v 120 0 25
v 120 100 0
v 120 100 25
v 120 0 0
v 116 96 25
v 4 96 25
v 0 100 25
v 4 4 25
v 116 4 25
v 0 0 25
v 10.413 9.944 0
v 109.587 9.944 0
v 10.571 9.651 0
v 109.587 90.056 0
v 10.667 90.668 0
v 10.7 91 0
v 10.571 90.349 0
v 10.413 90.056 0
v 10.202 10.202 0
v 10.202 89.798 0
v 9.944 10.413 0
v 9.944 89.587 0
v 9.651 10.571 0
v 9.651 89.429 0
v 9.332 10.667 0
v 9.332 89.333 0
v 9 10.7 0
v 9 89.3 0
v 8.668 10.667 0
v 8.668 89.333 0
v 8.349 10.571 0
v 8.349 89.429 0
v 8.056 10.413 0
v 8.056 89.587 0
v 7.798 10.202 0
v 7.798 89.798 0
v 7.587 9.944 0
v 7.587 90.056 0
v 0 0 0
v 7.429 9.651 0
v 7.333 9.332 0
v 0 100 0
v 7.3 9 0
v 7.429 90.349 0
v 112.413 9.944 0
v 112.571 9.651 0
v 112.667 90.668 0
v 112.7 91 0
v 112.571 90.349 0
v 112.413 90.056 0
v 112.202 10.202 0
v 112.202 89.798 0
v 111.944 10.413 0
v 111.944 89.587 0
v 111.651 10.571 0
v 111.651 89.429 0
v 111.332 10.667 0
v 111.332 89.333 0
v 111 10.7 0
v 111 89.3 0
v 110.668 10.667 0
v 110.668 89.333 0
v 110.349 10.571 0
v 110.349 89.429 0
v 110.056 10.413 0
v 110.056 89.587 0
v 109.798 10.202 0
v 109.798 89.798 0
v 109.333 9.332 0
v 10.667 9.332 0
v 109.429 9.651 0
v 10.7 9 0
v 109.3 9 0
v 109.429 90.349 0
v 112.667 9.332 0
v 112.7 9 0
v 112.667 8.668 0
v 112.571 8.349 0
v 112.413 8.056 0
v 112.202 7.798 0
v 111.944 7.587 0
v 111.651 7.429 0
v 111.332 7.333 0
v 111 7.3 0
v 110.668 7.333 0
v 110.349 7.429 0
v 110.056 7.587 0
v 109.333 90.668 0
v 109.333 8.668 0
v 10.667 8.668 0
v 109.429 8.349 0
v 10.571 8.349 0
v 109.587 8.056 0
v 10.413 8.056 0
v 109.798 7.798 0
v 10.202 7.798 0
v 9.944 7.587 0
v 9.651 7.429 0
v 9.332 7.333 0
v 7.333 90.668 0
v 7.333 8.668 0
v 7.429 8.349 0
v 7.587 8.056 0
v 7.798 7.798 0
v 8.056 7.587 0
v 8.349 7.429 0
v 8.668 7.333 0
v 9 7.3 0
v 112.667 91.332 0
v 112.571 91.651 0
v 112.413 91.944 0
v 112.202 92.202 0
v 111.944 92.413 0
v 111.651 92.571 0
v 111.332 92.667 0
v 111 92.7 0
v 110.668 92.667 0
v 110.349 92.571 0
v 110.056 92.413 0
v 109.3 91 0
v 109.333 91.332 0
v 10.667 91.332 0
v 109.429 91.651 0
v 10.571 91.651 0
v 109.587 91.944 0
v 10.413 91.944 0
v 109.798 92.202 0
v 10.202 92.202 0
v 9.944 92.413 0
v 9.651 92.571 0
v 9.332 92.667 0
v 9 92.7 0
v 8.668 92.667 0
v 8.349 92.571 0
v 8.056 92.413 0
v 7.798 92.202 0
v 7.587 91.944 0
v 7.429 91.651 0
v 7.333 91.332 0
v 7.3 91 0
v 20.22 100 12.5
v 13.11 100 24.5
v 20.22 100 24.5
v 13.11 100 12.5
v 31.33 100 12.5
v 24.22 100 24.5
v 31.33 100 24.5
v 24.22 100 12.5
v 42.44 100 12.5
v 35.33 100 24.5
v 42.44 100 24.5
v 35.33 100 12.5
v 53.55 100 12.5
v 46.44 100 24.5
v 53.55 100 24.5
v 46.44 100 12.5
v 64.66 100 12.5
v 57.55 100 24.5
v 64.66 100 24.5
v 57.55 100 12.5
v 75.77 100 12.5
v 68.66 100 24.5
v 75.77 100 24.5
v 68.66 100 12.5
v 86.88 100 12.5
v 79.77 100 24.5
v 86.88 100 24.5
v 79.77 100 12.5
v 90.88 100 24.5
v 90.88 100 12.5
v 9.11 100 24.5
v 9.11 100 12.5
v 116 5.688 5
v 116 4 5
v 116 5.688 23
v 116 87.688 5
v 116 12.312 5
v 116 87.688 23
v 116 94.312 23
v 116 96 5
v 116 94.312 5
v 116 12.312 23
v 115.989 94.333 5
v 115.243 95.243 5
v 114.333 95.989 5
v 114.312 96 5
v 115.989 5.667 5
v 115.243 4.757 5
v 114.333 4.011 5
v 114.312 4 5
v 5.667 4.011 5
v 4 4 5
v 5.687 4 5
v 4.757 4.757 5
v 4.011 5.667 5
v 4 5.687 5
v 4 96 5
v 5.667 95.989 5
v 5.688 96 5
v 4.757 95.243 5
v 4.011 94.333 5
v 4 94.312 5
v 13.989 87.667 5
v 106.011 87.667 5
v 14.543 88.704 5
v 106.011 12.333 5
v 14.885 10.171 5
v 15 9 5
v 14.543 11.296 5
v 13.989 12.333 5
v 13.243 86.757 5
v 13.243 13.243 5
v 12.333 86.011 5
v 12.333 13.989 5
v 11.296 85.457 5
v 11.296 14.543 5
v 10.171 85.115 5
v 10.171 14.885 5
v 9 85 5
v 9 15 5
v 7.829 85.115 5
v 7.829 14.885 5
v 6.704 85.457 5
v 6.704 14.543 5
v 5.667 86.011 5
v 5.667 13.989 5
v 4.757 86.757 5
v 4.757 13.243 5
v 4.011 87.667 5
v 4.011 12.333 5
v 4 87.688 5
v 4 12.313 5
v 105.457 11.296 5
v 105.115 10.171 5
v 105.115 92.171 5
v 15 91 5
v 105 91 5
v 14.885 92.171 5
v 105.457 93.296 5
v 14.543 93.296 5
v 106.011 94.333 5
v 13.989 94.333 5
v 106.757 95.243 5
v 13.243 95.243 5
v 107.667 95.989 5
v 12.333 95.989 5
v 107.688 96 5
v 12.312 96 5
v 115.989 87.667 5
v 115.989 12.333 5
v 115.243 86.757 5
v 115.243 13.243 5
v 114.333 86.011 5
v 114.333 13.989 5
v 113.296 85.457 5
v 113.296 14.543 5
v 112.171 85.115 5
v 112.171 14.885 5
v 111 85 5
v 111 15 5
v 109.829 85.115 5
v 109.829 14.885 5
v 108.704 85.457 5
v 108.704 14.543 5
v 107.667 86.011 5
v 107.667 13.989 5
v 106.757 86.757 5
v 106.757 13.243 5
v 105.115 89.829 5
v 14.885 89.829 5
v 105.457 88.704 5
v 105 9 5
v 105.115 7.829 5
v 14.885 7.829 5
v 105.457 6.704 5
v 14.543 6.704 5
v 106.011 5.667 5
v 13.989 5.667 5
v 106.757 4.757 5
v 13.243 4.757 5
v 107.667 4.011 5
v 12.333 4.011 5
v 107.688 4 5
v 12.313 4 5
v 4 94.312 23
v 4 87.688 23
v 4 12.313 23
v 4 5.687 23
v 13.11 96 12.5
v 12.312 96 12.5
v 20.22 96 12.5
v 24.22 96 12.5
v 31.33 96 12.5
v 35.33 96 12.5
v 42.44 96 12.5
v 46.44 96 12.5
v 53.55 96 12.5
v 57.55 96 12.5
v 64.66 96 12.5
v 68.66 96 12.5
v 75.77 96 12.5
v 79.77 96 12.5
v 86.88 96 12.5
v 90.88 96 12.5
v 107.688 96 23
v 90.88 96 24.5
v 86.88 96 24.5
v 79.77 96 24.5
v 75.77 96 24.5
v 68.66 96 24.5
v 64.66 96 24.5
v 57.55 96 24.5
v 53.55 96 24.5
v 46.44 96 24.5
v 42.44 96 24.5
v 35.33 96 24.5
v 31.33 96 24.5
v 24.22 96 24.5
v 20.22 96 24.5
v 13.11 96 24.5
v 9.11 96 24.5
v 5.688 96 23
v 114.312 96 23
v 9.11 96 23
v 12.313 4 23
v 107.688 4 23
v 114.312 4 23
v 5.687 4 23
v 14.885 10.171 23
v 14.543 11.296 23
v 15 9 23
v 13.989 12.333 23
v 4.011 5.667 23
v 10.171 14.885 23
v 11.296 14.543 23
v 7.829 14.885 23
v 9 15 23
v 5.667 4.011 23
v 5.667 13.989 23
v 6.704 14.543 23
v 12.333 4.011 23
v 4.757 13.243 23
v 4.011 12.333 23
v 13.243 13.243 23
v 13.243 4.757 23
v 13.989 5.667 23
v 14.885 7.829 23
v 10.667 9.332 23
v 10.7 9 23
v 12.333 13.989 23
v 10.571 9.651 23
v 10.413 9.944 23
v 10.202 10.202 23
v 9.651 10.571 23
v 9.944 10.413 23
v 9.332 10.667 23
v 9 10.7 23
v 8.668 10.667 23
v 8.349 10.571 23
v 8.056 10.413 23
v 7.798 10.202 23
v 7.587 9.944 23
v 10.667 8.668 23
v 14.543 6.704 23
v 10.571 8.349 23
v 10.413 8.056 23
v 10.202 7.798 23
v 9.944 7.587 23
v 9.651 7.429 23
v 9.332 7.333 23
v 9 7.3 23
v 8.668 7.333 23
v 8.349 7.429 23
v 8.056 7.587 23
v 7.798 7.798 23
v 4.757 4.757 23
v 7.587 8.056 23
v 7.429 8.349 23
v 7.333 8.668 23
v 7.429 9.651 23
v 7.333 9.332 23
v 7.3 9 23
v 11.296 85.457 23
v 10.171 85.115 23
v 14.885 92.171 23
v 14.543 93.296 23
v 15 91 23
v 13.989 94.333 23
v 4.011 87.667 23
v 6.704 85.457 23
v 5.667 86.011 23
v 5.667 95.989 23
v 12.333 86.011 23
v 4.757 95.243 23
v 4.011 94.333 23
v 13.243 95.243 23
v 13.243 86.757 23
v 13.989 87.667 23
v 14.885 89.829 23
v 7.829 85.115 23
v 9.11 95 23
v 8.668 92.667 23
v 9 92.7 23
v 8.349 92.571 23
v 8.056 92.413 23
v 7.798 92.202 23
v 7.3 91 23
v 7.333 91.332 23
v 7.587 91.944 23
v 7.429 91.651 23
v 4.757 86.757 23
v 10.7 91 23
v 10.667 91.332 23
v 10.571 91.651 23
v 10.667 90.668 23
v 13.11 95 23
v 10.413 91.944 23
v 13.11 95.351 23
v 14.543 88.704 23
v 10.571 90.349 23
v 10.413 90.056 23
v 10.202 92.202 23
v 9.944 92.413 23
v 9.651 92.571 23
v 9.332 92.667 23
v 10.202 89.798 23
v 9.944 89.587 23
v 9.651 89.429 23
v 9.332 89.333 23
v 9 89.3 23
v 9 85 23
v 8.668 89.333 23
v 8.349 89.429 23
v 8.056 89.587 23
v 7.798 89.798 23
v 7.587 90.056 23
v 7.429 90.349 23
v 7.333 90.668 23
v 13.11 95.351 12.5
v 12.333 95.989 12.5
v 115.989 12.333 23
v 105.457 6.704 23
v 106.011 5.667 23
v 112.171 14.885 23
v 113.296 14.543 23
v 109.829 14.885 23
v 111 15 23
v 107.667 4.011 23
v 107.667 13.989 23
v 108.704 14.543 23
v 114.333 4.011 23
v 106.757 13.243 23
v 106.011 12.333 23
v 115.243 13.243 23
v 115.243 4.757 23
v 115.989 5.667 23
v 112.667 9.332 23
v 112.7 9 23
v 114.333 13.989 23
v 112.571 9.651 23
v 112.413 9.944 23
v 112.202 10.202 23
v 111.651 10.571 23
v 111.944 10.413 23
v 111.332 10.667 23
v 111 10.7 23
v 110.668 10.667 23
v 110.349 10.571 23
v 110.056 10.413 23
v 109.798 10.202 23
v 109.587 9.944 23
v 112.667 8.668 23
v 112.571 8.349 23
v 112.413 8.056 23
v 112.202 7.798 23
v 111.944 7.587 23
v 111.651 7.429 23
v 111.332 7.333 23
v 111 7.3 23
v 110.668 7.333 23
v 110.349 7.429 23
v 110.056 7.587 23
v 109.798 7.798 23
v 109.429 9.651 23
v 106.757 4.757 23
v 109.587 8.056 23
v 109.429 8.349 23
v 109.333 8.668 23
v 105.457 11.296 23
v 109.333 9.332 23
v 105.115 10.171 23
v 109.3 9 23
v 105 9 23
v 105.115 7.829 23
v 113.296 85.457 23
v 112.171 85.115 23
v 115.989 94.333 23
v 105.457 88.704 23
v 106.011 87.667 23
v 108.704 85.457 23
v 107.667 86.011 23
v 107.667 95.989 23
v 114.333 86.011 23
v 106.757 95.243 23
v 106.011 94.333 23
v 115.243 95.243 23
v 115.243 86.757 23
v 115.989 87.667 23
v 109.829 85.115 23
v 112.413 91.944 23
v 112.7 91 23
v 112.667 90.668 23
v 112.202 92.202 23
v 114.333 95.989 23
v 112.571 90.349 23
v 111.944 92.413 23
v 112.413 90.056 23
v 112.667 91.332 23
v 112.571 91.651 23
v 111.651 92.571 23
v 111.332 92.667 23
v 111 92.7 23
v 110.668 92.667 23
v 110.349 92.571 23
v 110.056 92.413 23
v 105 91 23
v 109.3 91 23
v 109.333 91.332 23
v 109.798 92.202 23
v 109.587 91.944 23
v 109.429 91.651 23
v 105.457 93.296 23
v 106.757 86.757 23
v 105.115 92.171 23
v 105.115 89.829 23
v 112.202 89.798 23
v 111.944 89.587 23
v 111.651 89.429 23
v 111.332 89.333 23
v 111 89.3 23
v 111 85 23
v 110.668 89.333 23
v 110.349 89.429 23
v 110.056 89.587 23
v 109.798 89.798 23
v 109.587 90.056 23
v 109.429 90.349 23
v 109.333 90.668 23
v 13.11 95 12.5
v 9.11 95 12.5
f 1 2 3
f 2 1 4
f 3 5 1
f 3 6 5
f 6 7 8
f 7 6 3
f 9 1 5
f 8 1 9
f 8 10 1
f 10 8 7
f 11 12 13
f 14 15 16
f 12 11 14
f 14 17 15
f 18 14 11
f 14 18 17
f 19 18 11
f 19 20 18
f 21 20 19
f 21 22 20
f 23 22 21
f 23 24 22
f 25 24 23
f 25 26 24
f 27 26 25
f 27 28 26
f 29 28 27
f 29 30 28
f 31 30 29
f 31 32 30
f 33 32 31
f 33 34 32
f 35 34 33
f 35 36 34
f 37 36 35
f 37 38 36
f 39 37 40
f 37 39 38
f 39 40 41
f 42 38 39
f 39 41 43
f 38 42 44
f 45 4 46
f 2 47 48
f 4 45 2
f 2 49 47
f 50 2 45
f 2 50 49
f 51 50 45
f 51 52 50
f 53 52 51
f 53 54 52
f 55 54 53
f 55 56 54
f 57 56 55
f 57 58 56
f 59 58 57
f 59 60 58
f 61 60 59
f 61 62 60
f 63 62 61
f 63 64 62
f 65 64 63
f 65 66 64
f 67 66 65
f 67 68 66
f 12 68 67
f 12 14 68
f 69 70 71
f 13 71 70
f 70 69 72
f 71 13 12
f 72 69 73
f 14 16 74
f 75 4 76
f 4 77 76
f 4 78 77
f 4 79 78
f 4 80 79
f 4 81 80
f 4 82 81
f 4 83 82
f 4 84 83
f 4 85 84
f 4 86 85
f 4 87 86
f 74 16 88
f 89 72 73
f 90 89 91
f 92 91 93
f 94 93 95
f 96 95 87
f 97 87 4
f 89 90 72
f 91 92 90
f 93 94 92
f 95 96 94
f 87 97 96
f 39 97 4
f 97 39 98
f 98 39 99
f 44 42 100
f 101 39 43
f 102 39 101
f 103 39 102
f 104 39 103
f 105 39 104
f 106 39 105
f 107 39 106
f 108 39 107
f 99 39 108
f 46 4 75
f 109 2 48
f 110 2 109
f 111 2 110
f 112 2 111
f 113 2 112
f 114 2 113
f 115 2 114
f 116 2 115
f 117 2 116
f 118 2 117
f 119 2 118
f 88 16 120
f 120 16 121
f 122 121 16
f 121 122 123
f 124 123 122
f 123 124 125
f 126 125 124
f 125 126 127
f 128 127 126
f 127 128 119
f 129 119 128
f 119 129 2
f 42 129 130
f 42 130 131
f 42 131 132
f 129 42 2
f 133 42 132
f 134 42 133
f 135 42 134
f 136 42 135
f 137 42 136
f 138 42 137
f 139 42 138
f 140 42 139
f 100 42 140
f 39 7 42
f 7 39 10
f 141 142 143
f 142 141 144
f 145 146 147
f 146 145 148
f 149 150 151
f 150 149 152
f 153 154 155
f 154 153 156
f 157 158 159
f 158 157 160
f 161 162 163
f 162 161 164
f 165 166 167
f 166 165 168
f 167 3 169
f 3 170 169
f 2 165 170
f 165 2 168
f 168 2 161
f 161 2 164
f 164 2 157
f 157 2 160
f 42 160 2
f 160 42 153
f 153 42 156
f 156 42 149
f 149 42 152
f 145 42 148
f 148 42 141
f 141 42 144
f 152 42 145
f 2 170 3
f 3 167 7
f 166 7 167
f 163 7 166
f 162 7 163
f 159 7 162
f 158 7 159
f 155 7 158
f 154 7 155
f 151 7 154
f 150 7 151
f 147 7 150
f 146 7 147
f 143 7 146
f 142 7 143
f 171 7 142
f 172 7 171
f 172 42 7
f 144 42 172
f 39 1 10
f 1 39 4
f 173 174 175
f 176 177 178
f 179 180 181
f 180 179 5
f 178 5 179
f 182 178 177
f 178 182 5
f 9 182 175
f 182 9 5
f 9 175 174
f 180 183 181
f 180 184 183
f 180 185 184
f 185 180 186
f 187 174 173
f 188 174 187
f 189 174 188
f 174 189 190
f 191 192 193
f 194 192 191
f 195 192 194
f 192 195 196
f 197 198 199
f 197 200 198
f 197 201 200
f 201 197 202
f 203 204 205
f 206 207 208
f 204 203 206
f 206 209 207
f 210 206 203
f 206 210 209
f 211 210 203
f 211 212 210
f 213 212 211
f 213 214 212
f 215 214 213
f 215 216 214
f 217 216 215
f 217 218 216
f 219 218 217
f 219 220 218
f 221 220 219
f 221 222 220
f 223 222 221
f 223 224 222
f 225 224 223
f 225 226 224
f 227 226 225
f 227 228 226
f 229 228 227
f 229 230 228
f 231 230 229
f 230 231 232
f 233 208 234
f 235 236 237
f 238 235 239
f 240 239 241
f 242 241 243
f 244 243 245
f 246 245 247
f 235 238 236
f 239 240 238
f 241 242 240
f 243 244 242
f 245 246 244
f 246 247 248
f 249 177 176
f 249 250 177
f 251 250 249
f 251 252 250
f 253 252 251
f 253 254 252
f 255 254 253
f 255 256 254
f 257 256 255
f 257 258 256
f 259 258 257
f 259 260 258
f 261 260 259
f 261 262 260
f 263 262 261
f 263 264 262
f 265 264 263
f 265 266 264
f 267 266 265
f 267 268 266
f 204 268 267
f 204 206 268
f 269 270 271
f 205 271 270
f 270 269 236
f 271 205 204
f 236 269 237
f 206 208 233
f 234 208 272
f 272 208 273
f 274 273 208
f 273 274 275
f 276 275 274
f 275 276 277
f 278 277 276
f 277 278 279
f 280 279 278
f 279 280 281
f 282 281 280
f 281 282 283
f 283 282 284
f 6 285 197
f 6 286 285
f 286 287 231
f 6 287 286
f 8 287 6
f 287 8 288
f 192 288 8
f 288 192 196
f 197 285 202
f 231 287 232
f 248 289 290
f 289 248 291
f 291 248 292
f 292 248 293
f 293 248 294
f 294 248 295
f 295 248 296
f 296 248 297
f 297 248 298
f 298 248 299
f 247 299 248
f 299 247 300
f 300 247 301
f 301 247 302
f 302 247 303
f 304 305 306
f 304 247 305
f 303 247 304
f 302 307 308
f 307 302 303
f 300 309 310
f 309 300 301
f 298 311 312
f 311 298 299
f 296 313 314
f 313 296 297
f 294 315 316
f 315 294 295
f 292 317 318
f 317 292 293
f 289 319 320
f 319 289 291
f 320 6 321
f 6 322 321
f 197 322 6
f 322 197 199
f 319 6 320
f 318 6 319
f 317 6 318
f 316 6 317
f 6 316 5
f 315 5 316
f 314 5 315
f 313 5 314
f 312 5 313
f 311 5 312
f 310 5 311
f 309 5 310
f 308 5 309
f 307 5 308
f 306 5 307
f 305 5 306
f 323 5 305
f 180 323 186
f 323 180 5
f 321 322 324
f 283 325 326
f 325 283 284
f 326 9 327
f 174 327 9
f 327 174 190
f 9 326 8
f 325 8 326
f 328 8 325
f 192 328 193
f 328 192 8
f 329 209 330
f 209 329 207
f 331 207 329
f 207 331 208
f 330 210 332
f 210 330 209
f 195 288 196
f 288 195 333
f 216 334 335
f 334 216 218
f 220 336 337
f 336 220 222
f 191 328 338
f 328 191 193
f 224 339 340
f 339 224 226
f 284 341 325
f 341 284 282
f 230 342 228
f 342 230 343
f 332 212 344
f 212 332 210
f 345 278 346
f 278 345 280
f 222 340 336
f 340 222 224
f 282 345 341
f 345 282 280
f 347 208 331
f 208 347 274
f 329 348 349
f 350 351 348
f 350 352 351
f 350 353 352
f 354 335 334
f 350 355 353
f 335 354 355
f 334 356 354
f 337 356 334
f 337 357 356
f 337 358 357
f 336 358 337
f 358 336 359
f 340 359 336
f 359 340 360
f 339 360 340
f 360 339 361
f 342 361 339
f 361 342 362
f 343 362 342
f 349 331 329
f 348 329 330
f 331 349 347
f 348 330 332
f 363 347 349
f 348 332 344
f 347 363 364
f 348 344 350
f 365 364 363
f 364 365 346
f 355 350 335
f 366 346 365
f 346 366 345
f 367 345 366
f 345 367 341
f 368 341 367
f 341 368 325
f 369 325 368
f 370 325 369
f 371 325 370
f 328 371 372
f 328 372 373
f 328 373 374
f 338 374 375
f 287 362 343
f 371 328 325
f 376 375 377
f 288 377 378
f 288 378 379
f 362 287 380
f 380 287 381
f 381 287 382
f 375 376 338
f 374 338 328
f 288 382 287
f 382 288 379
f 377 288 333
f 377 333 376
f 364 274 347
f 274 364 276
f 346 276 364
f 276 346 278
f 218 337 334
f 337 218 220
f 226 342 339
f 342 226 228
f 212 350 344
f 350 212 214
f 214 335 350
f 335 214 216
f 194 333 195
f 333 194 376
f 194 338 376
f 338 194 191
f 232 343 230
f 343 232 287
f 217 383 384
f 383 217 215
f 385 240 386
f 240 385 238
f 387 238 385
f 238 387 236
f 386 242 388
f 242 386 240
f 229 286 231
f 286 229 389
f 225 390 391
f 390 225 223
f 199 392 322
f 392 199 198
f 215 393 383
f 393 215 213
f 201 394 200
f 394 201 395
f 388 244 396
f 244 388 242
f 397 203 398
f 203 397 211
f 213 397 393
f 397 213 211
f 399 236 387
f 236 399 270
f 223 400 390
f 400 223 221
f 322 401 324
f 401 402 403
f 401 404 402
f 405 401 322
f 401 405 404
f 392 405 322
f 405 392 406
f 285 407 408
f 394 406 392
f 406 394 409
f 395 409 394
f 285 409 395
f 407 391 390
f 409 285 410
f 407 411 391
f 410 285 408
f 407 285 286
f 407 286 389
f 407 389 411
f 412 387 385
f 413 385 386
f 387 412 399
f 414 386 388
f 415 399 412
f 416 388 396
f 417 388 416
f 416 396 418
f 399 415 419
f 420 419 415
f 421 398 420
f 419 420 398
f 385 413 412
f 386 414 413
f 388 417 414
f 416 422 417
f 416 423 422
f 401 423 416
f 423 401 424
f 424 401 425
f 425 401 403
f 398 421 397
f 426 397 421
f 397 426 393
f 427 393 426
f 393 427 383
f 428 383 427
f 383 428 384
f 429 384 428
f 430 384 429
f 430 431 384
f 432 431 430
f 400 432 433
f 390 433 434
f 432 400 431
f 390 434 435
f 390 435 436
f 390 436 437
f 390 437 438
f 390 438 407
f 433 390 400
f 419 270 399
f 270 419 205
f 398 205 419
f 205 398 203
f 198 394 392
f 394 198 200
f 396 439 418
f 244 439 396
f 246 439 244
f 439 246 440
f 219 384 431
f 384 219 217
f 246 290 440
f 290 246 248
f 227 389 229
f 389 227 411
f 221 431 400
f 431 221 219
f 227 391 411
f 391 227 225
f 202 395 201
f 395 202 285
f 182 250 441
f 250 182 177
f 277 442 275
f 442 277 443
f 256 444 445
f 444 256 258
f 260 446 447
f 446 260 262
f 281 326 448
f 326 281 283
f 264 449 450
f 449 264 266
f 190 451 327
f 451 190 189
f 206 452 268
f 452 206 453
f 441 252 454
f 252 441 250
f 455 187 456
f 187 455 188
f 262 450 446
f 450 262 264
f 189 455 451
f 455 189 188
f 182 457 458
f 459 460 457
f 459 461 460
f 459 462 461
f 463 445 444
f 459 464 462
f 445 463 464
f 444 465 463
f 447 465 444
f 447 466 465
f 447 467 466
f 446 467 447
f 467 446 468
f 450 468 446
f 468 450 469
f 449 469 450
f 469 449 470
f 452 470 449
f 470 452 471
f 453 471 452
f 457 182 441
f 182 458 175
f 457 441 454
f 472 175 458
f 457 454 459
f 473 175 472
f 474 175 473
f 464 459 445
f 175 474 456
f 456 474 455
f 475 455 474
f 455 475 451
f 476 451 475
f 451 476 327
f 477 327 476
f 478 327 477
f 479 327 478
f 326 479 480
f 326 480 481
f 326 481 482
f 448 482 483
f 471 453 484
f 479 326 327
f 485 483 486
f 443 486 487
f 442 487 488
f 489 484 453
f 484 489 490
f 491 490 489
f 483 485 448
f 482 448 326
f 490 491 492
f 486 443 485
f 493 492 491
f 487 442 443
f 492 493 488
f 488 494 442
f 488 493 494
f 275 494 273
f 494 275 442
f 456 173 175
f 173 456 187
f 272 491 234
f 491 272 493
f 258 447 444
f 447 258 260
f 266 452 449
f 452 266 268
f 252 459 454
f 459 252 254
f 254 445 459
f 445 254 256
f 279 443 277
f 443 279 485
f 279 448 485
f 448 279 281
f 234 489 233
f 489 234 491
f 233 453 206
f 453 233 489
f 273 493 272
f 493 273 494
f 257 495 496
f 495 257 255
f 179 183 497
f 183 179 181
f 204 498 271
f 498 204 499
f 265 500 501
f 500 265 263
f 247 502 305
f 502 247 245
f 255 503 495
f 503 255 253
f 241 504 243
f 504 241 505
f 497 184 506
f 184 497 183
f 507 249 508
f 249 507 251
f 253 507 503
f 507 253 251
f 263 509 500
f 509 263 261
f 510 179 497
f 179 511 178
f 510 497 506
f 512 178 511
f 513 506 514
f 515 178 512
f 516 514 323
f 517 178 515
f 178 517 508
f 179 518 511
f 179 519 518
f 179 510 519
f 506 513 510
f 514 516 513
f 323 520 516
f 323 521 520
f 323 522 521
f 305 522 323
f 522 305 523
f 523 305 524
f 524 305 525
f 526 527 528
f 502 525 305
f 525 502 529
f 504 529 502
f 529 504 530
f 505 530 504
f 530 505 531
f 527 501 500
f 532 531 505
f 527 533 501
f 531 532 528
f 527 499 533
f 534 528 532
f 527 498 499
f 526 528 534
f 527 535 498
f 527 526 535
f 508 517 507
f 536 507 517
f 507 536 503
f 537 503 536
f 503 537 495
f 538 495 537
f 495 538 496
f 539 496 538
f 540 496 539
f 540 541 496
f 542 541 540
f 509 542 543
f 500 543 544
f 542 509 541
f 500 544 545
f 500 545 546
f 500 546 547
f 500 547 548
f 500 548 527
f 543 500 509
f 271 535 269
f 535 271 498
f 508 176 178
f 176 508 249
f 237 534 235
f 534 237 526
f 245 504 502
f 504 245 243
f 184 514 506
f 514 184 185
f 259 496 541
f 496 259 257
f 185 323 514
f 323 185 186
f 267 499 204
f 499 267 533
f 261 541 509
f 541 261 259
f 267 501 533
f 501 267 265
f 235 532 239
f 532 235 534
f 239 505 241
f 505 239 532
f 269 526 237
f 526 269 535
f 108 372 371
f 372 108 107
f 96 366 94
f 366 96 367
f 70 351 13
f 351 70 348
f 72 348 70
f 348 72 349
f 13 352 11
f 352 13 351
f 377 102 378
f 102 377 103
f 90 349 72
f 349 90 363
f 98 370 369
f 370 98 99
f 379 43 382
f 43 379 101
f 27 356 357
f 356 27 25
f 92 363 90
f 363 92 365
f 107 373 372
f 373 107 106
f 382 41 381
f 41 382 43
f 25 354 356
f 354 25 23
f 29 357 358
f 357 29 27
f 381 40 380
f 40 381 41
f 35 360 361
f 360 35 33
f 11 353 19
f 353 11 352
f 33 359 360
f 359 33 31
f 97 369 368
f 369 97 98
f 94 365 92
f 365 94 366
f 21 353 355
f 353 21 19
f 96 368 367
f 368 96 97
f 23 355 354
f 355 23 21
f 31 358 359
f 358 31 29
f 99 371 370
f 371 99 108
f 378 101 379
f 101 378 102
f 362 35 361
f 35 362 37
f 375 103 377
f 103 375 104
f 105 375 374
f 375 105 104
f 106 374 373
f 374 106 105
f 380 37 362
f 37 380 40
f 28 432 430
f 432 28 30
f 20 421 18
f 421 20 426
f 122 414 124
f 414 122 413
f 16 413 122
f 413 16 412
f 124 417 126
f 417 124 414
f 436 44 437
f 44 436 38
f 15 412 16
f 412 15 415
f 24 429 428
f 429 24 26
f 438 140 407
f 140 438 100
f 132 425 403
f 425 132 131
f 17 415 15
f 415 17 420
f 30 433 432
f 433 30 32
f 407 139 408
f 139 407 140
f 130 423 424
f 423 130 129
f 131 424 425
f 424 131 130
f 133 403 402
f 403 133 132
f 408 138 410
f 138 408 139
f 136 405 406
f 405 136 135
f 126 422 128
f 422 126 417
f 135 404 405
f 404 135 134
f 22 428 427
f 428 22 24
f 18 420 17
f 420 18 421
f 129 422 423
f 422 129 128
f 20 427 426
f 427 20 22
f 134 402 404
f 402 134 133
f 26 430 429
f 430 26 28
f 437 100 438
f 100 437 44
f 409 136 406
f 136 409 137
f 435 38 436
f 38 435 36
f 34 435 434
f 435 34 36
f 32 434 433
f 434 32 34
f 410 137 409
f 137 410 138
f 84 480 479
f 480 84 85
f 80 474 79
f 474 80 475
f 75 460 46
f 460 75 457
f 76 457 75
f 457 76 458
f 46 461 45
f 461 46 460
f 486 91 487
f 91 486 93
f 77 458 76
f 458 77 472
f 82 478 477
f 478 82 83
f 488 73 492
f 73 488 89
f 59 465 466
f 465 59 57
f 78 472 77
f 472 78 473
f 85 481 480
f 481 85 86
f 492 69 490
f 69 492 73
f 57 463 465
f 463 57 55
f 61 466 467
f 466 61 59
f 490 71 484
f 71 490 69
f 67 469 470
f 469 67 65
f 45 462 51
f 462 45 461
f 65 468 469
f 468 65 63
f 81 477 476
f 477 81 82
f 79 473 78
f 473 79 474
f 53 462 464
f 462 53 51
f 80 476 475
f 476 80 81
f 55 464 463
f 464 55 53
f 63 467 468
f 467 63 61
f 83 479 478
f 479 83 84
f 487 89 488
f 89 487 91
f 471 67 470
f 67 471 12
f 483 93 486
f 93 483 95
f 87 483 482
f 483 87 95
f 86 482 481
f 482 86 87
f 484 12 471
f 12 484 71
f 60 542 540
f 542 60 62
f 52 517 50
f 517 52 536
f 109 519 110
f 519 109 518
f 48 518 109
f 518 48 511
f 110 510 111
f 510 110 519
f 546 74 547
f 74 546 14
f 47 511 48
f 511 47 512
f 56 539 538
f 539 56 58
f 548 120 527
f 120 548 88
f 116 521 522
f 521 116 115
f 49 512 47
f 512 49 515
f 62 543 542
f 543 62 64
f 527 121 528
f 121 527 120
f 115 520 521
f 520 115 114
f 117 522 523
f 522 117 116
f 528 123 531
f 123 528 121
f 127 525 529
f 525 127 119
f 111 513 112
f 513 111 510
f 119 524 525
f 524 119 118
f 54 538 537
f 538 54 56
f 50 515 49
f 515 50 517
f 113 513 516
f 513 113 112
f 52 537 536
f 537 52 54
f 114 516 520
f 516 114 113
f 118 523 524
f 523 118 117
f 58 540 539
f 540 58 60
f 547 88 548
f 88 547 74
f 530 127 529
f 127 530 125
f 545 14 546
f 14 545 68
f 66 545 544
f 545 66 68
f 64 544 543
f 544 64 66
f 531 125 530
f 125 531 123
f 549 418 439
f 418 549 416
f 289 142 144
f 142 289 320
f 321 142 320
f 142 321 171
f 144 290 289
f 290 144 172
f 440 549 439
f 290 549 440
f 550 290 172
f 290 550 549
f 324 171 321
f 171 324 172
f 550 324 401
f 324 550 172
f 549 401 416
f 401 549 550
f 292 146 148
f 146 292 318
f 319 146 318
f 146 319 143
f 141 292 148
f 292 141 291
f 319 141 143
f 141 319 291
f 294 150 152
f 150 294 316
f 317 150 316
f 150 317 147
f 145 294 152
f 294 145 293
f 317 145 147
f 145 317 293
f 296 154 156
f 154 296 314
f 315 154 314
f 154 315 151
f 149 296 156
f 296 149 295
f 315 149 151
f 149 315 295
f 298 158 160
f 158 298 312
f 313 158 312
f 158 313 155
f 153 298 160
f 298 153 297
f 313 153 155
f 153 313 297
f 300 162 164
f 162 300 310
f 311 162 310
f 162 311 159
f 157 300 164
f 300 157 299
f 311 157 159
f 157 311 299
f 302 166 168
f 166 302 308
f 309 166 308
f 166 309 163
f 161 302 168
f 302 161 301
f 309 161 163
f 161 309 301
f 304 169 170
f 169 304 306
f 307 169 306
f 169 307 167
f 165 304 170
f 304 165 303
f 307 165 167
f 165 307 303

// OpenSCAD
$fn = 32;

// ----------------------------------------------------------------------
// Enclosure body: 120 x 100 x 25 mm, wall 4 mm
// ----------------------------------------------------------------------

// --- parameters (mm) ---
length = 120;             // outside length, X
width = 100;              // outside width, Y
height = 25;              // outside height, Z
wall = 4;                 // side wall thickness
floor_t = 5;              // floor thickness
boss_d = 12;              // corner boss diameter
boss_h = 18;              // corner boss height above the floor
boss_hole_d = 3.4;        // lid screw clearance in the boss
boss_lip = 9;             // boss centre inset from the corner
vent_slots = 8;           // vent slots in the long wall
vent_w = 4;               // vent slot width
vent_h = 12;              // vent slot height
vent_pitch = 11.11;       // vent slot pitch
vent_z = 12.5;            // vent slot sill height

module shell() {
  difference() {
    cube([length, width, height]);
    /* hollow, open at the top */
    translate([wall, wall, floor_t])
      cube([length - 2 * wall, width - 2 * wall, height]);
  }
}

module bosses() {
  /* corner bosses, sunk 1 mm into the floor */
  for (sx = [0, 1]) for (sy = [0, 1])
    translate([sx * (length - 2 * boss_lip) + boss_lip, sy * (width - 2 * boss_lip) + boss_lip, floor_t - 1])
      cylinder(h = boss_h + 1, d = boss_d);
}

difference() {
  union() {
    shell();
    bosses();
  }
  /* boss screw holes */
  for (sx = [0, 1]) for (sy = [0, 1])
    translate([sx * (length - 2 * boss_lip) + boss_lip, sy * (width - 2 * boss_lip) + boss_lip, -1]) cylinder(h = floor_t + boss_h + 2, d = boss_hole_d);
  /* vent grille in the +Y wall */
  for (i = [0 : vent_slots - 1]) translate([vent_pitch * (i + 1) - vent_w / 2, width - wall - 1, vent_z]) cube([vent_w, wall + 2, vent_h]);
}
